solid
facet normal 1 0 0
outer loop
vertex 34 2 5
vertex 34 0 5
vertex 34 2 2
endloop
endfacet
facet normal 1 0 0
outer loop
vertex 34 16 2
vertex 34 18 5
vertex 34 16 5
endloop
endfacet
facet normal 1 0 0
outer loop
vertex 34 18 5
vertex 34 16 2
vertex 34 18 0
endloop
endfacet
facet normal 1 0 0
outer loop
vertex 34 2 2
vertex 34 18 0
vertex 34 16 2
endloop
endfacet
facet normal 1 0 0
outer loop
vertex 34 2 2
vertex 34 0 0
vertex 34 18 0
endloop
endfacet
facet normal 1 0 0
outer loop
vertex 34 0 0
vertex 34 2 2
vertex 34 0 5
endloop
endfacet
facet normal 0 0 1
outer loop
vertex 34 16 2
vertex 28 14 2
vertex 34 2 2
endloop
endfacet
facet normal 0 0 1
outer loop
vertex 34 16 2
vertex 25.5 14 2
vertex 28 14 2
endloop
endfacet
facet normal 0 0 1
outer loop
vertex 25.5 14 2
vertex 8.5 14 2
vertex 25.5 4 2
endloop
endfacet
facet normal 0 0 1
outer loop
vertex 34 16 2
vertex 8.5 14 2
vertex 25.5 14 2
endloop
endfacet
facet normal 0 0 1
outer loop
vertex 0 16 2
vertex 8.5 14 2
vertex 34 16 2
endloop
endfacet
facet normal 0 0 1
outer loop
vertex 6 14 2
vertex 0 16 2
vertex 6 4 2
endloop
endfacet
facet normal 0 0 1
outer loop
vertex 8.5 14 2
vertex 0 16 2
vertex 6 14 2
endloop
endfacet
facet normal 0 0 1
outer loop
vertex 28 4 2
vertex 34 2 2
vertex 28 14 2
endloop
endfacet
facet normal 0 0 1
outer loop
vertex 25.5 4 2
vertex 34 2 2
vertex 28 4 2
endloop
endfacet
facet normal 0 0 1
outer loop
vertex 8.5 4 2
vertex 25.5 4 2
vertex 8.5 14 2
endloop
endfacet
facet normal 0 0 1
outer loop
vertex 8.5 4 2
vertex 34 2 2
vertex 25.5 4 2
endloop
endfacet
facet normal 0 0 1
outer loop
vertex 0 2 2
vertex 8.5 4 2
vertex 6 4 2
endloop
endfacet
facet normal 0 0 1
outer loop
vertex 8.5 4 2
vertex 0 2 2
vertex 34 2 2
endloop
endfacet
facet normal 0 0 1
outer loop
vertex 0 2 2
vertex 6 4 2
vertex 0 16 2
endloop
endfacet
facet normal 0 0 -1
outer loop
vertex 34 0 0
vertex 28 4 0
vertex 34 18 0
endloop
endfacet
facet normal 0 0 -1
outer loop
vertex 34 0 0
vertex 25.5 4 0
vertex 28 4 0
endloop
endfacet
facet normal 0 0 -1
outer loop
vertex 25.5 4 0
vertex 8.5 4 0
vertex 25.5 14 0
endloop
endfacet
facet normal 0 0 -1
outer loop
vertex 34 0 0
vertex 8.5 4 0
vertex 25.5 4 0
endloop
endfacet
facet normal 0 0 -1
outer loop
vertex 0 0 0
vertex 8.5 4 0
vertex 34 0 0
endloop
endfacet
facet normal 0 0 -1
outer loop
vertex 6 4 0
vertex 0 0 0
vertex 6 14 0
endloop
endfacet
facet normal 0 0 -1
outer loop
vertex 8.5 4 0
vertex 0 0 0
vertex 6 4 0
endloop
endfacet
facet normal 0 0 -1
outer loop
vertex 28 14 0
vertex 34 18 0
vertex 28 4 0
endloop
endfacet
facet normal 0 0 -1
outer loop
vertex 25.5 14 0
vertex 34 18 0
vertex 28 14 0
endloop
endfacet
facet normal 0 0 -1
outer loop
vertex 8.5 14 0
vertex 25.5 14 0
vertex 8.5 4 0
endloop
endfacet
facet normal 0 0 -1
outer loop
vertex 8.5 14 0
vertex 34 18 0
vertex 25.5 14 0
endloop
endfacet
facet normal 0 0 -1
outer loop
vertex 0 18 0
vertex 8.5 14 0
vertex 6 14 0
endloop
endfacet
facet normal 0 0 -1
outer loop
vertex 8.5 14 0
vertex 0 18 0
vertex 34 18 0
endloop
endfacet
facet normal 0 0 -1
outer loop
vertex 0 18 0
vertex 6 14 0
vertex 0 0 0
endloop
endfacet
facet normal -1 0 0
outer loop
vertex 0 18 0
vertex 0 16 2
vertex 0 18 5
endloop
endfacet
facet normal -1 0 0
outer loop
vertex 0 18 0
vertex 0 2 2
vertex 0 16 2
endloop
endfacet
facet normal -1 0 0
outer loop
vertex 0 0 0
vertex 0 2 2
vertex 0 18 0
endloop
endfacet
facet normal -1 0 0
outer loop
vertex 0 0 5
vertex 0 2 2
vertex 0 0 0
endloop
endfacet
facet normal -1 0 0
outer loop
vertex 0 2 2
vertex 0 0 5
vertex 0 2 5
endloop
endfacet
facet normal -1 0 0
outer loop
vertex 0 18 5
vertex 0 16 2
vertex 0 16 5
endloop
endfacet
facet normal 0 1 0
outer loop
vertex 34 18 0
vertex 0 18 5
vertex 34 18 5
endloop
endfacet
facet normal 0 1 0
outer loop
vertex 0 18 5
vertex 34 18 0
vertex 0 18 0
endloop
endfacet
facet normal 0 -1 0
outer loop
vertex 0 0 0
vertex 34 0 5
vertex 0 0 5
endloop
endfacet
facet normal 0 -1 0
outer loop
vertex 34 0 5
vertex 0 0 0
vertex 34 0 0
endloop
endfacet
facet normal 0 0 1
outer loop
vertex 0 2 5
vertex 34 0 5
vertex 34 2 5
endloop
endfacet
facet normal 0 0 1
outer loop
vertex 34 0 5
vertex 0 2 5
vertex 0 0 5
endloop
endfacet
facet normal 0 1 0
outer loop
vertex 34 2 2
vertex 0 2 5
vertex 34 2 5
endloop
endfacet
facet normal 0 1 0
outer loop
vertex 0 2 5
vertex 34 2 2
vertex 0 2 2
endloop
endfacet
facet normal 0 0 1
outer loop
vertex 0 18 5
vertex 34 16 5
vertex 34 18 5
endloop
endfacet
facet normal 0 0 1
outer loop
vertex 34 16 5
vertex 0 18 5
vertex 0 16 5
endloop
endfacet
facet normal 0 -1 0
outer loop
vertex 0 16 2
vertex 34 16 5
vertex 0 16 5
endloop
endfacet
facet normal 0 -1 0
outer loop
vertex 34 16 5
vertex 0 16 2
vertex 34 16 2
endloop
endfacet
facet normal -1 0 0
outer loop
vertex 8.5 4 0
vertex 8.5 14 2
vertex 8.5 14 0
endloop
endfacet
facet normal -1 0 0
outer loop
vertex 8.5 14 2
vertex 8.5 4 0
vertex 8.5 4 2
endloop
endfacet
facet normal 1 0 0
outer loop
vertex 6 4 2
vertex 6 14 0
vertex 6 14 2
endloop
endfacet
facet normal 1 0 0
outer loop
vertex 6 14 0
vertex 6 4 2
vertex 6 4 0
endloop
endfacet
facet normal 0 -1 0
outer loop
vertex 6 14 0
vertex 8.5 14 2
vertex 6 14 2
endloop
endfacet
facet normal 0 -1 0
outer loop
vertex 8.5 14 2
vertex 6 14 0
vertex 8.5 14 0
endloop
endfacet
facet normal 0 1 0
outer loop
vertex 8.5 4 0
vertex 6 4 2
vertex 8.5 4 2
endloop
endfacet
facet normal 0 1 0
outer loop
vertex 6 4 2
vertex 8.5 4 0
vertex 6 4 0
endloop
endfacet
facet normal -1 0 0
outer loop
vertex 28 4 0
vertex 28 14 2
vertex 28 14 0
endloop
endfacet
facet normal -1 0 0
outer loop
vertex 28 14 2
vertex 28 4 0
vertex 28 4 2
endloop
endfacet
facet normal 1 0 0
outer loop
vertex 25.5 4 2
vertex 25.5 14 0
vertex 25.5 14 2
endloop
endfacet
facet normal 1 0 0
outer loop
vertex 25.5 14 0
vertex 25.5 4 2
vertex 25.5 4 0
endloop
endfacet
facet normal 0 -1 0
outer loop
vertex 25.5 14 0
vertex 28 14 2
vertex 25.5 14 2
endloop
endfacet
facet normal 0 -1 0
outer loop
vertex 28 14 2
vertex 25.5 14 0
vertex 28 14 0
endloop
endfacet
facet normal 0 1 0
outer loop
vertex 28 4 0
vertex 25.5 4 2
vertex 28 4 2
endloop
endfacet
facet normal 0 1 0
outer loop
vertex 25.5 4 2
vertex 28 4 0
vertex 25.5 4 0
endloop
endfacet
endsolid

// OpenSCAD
// Original MechIntel educational model. CC0-1.0. Units: mm.
// Not a standardized or load-rated component.
$fn=96;
length=34;
width=18;
base=2;
rail=2;
rail_height=3;
slot=2.5;
$fn=64;
difference(){
 union(){
  translate([0,0,0]) cube([length,width,base]);
  translate([0,0,base]) cube([length,rail,rail_height]);
  translate([0,width-rail,base]) cube([length,rail,rail_height]);
 }
 translate([6,4,-1]) cube([slot,width-8,base+1]);
 translate([length-6-slot,4,-1]) cube([slot,width-8,base+1]);
}
